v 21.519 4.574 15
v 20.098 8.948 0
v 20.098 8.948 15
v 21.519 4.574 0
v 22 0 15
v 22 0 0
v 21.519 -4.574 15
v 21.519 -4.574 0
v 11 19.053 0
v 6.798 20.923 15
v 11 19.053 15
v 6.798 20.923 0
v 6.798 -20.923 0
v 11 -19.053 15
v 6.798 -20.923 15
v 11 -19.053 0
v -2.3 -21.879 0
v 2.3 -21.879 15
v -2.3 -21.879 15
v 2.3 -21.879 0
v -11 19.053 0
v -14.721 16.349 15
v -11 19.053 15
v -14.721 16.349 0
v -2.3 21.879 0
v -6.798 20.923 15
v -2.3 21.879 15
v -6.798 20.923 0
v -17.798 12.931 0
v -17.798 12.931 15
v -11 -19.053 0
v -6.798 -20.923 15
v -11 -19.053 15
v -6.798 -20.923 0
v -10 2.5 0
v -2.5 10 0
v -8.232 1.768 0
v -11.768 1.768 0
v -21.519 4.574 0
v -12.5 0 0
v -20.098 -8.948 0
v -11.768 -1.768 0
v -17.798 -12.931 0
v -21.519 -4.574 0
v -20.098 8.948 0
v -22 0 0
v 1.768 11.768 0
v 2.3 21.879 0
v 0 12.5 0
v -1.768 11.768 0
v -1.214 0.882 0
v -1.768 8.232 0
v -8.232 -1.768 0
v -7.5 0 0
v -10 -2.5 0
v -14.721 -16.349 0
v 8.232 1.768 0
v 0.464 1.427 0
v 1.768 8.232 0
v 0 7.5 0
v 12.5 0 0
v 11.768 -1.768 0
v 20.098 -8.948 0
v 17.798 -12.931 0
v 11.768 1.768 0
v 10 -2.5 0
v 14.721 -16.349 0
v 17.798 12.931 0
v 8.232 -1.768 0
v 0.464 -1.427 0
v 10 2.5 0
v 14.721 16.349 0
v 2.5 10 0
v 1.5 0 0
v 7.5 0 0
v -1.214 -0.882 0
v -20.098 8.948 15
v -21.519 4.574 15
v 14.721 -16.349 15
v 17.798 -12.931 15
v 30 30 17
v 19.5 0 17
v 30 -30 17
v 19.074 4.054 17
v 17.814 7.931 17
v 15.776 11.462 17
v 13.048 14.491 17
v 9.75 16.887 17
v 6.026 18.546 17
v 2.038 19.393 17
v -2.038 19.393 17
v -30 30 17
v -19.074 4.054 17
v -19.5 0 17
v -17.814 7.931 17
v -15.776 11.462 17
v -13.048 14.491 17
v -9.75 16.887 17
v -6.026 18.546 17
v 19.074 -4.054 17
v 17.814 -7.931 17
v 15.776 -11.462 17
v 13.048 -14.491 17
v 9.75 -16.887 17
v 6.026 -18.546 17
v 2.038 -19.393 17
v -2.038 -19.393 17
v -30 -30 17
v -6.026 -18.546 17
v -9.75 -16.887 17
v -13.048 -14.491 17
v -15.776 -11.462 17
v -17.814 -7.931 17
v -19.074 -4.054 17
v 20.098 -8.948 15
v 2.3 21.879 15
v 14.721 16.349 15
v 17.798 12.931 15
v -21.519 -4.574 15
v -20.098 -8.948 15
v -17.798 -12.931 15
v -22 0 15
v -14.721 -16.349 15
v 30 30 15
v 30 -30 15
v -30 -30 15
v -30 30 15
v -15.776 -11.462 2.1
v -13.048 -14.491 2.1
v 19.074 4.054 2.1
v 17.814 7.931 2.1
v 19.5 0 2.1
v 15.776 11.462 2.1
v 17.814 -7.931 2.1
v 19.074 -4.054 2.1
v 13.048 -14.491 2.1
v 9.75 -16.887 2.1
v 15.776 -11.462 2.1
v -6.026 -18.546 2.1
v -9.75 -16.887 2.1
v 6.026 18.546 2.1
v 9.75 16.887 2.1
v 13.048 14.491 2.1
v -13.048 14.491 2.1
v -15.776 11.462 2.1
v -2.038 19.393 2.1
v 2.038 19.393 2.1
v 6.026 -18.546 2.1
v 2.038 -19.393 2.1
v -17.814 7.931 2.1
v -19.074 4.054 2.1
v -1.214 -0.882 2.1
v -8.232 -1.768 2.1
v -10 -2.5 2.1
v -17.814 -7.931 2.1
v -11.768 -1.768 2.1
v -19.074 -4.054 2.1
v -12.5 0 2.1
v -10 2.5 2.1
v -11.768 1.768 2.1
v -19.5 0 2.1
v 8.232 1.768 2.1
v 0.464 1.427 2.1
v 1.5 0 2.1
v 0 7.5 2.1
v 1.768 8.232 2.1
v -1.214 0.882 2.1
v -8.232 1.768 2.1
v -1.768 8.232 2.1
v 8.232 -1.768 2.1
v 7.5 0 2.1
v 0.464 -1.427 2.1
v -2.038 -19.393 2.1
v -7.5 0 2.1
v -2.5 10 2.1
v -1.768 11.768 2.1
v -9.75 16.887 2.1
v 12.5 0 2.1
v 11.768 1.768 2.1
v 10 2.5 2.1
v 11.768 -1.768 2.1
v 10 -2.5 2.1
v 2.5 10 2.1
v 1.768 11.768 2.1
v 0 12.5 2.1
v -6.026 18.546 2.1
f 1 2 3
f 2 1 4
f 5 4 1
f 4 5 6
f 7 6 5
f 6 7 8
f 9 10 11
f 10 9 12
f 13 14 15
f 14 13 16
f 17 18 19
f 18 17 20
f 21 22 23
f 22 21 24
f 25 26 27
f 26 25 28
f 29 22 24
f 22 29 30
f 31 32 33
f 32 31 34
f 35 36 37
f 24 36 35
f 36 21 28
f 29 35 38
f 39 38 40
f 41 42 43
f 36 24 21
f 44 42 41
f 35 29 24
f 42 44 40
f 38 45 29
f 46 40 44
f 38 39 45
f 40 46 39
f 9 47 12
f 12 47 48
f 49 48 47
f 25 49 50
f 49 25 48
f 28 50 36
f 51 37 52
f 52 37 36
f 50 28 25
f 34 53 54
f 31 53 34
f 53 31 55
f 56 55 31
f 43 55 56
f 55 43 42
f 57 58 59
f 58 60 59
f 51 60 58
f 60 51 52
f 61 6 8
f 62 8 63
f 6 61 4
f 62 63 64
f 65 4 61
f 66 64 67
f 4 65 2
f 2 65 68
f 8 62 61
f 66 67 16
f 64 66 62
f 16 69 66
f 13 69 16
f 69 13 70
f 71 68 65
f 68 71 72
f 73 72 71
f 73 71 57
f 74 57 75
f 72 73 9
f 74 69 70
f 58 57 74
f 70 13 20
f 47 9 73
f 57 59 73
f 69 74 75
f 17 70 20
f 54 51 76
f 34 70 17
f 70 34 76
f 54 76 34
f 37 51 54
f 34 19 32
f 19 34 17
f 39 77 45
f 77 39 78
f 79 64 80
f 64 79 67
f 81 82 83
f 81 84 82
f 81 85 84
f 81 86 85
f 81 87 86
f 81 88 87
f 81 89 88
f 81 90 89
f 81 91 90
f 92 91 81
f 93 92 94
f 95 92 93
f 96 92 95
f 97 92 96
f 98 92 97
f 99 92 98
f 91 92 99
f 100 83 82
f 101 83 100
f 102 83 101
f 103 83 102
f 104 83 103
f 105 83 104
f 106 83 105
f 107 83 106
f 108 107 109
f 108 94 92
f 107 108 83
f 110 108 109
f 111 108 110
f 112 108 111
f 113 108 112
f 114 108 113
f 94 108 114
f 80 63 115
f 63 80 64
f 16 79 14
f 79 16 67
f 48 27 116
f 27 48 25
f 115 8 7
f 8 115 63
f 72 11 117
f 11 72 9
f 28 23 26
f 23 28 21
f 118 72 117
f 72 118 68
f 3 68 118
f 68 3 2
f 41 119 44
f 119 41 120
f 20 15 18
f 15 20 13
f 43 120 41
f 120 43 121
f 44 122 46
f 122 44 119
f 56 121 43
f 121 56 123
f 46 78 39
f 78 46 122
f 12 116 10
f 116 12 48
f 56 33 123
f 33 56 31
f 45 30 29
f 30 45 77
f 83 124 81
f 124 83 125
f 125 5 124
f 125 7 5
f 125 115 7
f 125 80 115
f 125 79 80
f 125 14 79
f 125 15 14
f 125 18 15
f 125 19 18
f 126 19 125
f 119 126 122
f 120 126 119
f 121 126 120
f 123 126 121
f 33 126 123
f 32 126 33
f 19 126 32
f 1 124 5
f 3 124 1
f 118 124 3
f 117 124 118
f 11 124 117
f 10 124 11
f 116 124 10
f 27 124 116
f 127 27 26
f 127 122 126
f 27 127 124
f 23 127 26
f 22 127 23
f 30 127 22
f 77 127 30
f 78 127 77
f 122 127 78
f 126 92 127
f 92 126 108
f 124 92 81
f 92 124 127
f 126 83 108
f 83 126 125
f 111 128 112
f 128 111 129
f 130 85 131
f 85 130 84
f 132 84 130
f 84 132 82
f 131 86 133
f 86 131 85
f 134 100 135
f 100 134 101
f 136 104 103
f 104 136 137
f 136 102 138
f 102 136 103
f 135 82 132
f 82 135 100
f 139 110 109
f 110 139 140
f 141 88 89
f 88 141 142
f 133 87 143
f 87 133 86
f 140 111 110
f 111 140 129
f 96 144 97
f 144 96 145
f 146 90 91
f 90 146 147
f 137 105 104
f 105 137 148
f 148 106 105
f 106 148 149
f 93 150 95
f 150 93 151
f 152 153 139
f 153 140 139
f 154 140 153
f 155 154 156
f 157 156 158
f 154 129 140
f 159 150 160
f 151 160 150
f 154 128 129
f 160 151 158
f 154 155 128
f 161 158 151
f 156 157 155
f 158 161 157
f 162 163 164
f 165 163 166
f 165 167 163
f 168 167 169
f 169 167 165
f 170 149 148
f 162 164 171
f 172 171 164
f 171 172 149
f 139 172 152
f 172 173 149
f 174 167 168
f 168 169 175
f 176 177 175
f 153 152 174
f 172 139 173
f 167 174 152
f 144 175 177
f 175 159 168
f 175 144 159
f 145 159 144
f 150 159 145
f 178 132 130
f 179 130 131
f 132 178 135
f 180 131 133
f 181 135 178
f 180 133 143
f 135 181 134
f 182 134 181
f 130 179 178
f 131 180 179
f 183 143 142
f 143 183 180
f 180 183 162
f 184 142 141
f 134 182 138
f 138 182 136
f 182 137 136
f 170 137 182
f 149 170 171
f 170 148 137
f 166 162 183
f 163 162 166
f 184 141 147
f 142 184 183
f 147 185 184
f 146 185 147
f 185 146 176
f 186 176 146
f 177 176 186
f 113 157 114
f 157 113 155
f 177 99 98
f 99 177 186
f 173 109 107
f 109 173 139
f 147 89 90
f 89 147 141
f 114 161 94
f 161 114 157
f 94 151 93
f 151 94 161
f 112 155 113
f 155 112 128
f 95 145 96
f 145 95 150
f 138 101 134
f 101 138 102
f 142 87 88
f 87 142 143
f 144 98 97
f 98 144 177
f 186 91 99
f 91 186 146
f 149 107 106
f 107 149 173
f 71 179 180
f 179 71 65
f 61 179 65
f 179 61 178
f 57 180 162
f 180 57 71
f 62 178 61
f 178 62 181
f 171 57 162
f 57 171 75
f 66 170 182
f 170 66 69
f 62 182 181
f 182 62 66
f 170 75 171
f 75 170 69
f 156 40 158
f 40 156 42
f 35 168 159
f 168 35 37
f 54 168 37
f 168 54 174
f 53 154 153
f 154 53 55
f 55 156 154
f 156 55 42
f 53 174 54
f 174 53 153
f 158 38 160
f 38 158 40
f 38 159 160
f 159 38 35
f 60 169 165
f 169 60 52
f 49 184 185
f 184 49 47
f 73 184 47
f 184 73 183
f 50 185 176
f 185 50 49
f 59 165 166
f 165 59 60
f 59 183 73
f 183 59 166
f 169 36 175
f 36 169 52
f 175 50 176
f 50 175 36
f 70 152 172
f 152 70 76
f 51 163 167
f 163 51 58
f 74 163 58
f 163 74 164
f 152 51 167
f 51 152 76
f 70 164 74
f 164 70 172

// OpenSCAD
/* faceplate of electrical outlet */ 
module faceplate(){
   difference(){
      starting_block();
      translate([0,0,2.1])cylinder(15,19.5,19.5);   
      translate([10,0,-0.1])cylinder(3,2.5,2.5);
      translate([-10,0,-0.1])cylinder(3,2.5,2.5);
      translate([0,10,-0.1])cylinder(3,2.5,2.5);
      translate([0,0,-0.1])cylinder(3,1.5,1.5);
   }
}
module starting_block(){
   union (){
      cylinder(17,22,22);
      translate([-30,-30,15])cube([60,60,2]);
   }
}

faceplate();
